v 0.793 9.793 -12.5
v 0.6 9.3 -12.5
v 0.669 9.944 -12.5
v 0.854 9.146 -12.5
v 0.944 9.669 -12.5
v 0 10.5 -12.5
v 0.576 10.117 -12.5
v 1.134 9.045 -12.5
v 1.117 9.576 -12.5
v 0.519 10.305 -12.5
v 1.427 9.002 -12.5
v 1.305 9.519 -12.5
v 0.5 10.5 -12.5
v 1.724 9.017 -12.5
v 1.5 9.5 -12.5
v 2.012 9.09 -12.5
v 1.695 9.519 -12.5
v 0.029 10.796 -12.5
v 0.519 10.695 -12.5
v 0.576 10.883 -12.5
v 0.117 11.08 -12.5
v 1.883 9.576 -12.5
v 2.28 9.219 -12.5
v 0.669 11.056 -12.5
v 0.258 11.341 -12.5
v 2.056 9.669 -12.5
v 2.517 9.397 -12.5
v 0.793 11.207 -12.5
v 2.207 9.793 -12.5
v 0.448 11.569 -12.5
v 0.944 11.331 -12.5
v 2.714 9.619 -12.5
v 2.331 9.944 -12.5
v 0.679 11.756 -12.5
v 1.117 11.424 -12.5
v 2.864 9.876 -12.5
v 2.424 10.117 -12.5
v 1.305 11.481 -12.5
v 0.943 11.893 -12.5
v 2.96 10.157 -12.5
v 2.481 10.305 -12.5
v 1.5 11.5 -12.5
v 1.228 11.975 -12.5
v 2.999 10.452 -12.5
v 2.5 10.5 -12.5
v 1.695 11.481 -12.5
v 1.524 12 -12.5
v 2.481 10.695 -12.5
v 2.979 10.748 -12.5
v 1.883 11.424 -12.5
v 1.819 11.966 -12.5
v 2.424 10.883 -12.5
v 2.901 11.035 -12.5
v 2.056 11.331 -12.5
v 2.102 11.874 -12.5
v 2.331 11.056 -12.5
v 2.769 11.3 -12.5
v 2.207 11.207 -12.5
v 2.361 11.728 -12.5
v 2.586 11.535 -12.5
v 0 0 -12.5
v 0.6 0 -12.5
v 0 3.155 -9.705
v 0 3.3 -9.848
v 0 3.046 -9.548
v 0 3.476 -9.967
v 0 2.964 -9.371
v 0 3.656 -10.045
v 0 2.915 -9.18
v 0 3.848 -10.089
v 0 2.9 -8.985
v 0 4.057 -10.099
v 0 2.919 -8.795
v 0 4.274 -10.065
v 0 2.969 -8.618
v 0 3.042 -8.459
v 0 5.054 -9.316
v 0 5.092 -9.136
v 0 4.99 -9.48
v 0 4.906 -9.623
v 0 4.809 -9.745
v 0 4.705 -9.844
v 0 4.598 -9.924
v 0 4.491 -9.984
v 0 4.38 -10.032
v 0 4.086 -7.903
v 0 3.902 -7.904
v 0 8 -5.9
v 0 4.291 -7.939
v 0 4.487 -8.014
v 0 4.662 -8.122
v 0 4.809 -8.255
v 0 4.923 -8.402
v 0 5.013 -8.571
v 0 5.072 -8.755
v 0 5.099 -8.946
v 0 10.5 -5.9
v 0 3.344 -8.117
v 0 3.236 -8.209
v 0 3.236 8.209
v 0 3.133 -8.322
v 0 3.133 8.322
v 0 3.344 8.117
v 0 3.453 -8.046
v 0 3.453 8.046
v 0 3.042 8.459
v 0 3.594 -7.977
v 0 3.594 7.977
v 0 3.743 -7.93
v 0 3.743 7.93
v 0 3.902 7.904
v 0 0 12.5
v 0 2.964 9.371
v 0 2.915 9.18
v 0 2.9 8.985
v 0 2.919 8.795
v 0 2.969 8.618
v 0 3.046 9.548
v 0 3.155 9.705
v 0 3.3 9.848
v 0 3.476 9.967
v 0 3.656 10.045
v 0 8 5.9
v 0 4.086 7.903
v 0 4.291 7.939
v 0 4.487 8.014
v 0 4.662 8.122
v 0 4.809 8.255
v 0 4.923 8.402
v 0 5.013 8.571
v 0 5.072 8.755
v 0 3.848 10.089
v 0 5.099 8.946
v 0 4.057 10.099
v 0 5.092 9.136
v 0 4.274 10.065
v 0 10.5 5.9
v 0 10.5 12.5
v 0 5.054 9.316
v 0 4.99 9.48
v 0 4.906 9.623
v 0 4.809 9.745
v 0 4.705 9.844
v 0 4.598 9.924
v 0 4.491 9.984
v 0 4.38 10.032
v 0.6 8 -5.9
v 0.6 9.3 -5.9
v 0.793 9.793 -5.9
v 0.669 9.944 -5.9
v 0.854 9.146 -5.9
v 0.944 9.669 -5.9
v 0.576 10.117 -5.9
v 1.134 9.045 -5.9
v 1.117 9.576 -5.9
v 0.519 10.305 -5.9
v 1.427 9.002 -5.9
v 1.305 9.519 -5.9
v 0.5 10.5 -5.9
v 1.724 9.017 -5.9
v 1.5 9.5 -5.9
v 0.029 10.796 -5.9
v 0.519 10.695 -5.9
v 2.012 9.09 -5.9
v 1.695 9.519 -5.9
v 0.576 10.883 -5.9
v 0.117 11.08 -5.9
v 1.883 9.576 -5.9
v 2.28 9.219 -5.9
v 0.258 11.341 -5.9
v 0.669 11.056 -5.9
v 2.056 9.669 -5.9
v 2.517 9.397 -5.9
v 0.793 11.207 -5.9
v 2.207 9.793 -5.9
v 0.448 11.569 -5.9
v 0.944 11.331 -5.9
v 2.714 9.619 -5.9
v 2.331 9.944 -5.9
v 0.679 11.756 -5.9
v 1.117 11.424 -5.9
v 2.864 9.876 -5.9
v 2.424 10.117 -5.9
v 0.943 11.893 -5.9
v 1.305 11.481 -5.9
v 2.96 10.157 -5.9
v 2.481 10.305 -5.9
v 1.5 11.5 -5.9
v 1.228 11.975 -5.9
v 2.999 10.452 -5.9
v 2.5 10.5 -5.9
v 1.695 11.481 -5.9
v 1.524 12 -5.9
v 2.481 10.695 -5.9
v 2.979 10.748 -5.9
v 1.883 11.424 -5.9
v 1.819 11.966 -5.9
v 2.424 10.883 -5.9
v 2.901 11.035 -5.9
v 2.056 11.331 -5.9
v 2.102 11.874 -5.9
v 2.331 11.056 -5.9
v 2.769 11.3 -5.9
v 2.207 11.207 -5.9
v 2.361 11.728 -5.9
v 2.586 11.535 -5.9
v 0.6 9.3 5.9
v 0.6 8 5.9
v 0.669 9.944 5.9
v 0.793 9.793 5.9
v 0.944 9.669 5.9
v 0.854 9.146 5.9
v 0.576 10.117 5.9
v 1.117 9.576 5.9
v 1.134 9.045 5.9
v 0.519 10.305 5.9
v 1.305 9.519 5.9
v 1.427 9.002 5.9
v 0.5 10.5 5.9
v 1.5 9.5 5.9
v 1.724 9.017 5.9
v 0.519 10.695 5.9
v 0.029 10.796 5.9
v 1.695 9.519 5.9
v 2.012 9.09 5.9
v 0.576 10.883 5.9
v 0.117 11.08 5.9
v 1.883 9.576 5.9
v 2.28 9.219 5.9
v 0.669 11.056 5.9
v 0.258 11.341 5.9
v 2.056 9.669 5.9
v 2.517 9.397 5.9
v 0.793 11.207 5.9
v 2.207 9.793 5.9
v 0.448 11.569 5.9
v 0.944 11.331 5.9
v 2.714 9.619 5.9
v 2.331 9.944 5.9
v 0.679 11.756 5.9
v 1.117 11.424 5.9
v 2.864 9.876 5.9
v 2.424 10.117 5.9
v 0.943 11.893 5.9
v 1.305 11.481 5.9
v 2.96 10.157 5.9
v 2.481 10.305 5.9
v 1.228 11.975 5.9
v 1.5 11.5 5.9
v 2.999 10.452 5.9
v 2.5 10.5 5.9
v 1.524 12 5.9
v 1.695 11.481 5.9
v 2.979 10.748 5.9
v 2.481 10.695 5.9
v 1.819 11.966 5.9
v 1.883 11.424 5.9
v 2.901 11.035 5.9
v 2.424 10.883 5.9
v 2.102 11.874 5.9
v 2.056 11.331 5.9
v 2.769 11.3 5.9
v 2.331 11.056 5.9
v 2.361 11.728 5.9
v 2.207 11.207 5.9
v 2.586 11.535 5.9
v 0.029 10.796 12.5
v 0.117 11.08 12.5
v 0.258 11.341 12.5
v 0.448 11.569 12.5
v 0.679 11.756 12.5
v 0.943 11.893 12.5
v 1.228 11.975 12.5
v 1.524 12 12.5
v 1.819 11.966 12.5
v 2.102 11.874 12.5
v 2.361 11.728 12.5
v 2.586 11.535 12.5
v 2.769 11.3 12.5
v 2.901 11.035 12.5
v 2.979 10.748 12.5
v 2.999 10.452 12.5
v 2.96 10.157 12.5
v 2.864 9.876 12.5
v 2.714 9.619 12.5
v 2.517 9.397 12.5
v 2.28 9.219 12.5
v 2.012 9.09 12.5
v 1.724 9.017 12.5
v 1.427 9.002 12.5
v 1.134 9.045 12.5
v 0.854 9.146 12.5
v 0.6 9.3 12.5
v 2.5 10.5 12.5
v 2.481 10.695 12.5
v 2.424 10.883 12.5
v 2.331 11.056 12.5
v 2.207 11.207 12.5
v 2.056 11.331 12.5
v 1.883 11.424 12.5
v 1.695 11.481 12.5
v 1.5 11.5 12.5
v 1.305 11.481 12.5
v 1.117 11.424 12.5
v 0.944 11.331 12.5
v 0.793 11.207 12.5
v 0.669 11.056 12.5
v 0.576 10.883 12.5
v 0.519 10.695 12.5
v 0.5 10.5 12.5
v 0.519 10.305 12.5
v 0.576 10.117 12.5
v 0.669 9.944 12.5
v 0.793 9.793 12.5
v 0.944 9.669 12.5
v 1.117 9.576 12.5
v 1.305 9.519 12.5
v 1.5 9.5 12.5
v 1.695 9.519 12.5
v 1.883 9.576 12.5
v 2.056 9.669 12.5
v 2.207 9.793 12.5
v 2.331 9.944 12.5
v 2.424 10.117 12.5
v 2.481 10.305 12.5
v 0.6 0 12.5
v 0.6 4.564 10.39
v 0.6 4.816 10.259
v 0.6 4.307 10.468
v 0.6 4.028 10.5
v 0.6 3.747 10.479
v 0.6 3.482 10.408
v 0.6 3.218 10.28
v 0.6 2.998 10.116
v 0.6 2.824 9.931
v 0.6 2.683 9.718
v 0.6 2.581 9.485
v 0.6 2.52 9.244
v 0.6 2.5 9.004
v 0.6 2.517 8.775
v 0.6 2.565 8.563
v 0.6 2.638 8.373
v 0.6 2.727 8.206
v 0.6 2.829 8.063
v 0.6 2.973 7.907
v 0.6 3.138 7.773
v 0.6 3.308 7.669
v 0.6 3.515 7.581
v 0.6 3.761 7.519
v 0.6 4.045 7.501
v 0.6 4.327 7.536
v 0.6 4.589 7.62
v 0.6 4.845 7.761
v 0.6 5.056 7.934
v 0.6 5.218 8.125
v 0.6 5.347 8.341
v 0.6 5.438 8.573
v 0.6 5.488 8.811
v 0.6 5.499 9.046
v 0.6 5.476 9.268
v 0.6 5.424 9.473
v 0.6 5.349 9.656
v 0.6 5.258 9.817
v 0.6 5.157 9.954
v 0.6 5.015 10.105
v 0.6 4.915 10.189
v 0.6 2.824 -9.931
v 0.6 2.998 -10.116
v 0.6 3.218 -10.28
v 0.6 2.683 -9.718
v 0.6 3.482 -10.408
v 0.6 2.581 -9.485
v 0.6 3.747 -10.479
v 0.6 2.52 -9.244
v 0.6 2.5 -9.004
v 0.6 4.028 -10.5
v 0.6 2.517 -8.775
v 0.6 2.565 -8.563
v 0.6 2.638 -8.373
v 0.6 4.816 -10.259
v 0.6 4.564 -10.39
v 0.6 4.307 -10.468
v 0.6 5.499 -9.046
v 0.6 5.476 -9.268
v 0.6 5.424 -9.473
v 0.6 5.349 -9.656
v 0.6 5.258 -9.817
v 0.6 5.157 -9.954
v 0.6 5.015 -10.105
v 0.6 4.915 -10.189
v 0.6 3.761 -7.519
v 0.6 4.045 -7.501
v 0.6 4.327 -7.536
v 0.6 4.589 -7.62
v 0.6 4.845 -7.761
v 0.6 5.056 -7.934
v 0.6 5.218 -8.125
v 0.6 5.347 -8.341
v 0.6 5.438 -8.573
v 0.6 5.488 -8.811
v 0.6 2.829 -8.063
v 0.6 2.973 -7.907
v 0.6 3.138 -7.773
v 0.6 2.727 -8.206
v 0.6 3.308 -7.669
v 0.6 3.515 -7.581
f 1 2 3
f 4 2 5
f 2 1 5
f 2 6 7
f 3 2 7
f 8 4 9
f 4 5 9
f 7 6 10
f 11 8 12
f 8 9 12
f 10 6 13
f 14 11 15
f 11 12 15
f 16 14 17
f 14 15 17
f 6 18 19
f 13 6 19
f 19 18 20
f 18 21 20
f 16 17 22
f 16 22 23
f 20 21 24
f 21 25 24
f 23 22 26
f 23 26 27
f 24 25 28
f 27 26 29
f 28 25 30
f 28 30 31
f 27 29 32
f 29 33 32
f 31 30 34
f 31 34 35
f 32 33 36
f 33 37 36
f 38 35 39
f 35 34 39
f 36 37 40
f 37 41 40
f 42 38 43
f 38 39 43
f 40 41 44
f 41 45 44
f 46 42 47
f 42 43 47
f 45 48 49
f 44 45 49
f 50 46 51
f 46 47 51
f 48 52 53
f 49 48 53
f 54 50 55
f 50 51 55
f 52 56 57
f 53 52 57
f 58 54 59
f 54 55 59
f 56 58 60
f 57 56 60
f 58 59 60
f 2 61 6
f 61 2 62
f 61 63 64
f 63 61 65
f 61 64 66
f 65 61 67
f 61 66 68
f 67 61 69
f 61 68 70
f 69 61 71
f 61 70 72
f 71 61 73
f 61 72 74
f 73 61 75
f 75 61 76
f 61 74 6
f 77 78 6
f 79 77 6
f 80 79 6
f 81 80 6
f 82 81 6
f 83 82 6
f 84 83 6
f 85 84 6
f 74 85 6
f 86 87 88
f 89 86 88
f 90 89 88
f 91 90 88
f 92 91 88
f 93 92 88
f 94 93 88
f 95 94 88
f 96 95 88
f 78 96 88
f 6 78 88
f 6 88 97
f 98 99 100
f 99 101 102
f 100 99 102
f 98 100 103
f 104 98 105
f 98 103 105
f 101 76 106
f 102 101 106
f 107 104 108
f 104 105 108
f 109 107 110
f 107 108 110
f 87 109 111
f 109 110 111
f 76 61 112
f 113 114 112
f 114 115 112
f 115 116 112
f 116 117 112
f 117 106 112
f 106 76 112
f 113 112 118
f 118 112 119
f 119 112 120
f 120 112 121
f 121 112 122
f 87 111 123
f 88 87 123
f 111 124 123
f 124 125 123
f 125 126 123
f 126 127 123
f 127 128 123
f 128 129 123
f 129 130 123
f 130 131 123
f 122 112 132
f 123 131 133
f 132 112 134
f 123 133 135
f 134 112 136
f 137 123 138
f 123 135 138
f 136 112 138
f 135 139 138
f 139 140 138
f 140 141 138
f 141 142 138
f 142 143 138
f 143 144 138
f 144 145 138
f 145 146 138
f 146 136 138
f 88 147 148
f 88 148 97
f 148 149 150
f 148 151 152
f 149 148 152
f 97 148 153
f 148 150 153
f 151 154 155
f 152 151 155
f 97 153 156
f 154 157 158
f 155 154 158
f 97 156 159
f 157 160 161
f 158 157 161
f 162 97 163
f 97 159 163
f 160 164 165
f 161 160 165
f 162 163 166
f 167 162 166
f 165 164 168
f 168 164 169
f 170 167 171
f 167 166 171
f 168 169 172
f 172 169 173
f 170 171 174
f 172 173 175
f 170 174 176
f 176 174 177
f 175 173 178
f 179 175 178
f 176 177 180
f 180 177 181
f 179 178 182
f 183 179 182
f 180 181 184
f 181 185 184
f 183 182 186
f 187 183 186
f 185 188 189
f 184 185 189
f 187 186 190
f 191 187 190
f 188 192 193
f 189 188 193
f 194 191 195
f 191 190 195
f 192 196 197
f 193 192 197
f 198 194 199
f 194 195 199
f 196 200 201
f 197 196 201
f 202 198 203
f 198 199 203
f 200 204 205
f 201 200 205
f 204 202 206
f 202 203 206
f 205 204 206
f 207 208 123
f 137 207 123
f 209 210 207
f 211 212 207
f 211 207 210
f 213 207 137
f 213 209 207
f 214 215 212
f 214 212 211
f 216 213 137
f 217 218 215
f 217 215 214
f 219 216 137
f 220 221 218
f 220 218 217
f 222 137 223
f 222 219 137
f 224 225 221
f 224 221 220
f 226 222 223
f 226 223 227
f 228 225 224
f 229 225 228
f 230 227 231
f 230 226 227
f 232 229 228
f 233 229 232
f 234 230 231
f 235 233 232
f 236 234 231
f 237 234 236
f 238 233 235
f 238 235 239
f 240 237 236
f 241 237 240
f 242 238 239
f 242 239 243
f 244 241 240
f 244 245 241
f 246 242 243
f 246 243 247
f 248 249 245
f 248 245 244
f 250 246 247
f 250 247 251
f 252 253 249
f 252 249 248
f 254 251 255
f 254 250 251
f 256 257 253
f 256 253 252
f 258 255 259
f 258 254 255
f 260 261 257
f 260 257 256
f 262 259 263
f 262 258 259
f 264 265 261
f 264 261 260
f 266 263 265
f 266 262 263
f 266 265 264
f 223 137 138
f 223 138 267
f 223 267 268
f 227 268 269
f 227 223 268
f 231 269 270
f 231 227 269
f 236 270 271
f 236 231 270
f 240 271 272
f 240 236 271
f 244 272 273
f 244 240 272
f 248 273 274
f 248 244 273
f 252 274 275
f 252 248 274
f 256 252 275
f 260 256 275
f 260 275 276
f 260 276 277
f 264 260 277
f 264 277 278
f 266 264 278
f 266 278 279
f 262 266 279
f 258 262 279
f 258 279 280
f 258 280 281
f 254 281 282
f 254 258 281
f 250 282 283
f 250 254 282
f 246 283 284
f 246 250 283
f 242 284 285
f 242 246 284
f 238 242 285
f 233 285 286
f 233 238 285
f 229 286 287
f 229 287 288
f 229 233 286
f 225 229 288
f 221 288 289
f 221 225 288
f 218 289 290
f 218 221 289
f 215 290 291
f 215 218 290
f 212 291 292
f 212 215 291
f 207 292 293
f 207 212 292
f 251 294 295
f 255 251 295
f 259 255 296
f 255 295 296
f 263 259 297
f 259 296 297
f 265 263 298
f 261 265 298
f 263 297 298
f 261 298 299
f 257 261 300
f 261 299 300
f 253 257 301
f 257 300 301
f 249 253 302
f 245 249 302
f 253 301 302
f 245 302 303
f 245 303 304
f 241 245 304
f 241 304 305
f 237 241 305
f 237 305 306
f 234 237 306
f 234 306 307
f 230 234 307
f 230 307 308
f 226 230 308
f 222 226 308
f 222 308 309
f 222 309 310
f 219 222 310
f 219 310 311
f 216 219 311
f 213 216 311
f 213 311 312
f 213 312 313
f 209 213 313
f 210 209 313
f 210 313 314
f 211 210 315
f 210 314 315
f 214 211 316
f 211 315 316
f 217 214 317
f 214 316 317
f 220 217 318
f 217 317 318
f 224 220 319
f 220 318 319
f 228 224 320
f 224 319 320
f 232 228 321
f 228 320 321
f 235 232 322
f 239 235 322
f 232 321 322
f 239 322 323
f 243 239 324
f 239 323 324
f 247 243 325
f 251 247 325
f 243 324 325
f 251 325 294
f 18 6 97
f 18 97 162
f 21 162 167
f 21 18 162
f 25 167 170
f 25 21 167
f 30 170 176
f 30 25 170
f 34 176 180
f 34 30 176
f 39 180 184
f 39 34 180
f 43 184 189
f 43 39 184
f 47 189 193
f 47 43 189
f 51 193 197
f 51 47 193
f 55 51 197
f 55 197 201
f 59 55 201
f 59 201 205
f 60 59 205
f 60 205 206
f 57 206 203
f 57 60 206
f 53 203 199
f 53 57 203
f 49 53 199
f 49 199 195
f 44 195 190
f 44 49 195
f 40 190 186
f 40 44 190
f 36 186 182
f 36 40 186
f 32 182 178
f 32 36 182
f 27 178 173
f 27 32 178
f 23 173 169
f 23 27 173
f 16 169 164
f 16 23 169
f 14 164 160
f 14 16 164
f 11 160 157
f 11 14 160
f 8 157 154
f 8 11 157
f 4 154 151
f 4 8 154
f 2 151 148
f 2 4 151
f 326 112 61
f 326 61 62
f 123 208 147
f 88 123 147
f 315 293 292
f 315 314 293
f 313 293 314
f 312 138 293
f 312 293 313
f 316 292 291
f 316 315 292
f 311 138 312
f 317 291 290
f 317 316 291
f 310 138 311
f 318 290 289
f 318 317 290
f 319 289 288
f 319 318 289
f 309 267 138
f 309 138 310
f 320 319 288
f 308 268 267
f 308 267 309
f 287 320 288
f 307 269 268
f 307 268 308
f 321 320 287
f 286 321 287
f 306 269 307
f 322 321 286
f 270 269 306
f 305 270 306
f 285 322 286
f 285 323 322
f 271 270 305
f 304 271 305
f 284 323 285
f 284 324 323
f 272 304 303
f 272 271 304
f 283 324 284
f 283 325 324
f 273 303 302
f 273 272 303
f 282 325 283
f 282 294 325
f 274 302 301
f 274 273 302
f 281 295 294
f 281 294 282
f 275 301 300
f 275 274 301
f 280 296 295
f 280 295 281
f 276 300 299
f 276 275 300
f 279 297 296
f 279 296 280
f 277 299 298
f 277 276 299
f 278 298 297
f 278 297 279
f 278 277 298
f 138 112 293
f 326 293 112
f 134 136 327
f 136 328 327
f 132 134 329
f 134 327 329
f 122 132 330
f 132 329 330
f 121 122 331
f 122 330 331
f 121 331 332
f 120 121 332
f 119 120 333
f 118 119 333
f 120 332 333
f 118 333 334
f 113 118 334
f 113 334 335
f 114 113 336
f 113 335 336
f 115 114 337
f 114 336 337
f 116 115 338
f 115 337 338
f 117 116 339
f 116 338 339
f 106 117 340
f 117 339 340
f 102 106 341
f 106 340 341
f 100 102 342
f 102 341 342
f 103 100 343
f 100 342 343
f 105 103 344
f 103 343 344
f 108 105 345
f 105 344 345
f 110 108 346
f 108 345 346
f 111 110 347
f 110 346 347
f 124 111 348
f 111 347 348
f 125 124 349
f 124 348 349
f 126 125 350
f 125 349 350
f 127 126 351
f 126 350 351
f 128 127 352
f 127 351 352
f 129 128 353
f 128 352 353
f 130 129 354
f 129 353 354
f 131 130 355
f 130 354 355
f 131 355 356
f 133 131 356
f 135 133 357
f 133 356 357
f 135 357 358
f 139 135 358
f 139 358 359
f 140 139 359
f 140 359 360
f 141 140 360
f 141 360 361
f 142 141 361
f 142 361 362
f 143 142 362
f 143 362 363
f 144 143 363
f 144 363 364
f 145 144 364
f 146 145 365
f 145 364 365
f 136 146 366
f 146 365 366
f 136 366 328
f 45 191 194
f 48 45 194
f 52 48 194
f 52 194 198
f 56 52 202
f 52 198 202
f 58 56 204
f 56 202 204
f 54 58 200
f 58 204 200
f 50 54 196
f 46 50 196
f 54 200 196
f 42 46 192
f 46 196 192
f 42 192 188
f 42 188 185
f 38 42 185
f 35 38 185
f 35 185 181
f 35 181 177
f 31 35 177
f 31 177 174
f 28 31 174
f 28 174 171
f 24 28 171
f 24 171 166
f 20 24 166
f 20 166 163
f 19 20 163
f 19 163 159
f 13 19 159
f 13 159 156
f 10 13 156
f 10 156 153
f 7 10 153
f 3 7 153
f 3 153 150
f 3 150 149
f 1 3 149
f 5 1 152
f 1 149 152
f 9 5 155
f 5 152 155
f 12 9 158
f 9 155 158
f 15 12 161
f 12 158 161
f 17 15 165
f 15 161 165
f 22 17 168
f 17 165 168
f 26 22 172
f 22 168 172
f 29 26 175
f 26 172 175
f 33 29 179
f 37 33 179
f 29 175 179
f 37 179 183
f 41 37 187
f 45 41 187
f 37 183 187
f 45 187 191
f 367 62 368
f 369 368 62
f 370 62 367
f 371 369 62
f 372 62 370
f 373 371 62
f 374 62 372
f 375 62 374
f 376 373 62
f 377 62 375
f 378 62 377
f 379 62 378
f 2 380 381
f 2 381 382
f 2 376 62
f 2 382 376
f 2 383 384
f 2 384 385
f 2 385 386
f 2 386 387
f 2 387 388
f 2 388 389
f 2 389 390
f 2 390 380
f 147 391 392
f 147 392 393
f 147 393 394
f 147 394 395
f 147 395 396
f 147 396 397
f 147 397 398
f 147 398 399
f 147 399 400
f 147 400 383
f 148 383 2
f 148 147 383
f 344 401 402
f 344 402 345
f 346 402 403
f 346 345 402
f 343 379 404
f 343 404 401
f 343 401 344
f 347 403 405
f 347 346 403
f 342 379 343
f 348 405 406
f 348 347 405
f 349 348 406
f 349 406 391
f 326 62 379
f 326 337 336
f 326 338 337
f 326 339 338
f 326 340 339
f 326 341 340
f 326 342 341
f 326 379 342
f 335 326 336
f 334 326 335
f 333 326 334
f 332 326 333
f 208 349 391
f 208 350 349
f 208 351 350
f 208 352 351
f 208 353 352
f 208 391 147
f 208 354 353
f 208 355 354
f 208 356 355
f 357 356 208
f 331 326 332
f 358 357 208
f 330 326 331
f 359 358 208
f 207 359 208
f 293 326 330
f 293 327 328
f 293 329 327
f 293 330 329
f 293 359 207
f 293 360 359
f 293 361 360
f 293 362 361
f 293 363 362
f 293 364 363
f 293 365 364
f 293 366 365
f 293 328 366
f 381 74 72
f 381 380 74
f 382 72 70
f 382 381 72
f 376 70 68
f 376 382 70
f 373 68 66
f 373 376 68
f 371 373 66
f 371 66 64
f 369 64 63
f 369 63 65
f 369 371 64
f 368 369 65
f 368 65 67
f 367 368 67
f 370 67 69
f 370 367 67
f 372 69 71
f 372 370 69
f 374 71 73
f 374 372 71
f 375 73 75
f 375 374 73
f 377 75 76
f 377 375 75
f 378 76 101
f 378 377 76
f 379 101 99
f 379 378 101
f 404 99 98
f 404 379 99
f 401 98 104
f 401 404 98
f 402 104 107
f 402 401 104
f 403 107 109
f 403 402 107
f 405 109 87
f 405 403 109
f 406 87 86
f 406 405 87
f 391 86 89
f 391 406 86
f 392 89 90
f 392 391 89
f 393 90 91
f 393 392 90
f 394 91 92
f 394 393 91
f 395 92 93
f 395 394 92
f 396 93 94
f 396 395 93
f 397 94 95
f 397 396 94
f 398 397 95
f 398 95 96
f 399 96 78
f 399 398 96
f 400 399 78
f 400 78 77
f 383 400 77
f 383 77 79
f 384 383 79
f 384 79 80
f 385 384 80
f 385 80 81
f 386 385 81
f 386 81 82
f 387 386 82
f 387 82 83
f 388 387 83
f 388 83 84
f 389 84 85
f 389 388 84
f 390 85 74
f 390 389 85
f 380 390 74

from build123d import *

# Parameters (mm, degrees)
SKETCH_1_W          = 0.6
SKETCH_1_H          = 10.5
EXTRUDE_1_DEPTH     = 12.5
SKETCH_2_R          = 1.5
SKETCH_3_R          = 1
CUT_EXTRUDE_1_DEPTH = 28.892651362
SKETCH_10_W         = 11.8
SKETCH_10_H         = 6
CUT_EXTRUDE_4_DEPTH = 60


with BuildPart() as part:
    # 草图1 → 拉伸-薄壁1 (new, symmetric)
    with BuildSketch(Plane.XY):
        with Locations((0.3, 5.25)):
            Rectangle(SKETCH_1_W, SKETCH_1_H)
    extrude(amount=EXTRUDE_1_DEPTH, both=True)

    # 扫描1: sweep along a curve in space
    with BuildLine() as sweep_1_path:
        Line((0.6, 10.5, 12.5), (0.6, 10.5, -12.5))
    # 草图2 → 扫描1 (sweep)
    with BuildSketch(Plane.XY.offset(12.5)):
        with Locations((1.5, 10.5)):
            Circle(SKETCH_2_R)
    sweep(path=sweep_1_path.line)

    # 草图3 → 切除-拉伸1 (cut, through all)
    with BuildSketch(Plane.XY.offset(12.5)):
        with Locations((1.5, 10.5)):
            Circle(SKETCH_3_R)
    extrude(amount=-CUT_EXTRUDE_1_DEPTH, mode=Mode.SUBTRACT)

    # 草图10 → 切除-拉伸4 (cut, symmetric)
    with BuildSketch(Plane(origin=(0.6, 0, 0), x_dir=(0, 0, -1), z_dir=(1, 0, 0))):
        with Locations((0, 11)):
            Rectangle(SKETCH_10_W, SKETCH_10_H)
    extrude(amount=CUT_EXTRUDE_4_DEPTH, both=True, mode=Mode.SUBTRACT)

    # 切除-放样1: read off the stored shape, not the designer's step
    # 切除-放样1: loft between two sections, ruled curve by curve
    loft_1_from = [
        Edge.make_bspline([(0, 4.274228258, 10.065269385), (0, 2.143689489, 10.613725902), (0, 1.595232972, 8.483187132), (0, 3.725771742, 7.934730615), (0, 5.856310511, 7.386274098), (0, 6.404767028, 9.516812868), (0, 4.274228258, 10.065269385)], [0, 0, 0, 0, 0.5, 0.5, 0.5, 1, 1, 1, 1], 3, [1, 0.333333333, 0.333333333, 1, 0.333333333, 0.333333333, 1]),
    ]
    loft_1_to = [
        Edge.make_bspline([(0.6, 4.815640724, 10.258860679), (0.6, 2.297919366, 11.890142127), (0.6, 0.666637918, 9.372420769), (0.6, 3.184359276, 7.741139321), (0.6, 5.702080634, 6.109857873), (0.6, 7.333362082, 8.627579231), (0.6, 4.815640724, 10.258860679)], [0, 0, 0, 0, 0.5, 0.5, 0.5, 1, 1, 1, 1], 3, [1, 0.333333333, 0.333333333, 1, 0.333333333, 0.333333333, 1]),
    ]
    loft_1 = Solid(Shell([*[Face.make_surface_from_curves(loft_1_from[k], loft_1_to[k]) for k in range(1)], Face(Wire(loft_1_from)), Face(Wire(loft_1_to))]))
    add(loft_1, mode=Mode.SUBTRACT)

    # 镜向1: 切除-放样1 across plane
    add(loft_1.mirror(Plane.XY), mode=Mode.SUBTRACT)


solid = part.part
